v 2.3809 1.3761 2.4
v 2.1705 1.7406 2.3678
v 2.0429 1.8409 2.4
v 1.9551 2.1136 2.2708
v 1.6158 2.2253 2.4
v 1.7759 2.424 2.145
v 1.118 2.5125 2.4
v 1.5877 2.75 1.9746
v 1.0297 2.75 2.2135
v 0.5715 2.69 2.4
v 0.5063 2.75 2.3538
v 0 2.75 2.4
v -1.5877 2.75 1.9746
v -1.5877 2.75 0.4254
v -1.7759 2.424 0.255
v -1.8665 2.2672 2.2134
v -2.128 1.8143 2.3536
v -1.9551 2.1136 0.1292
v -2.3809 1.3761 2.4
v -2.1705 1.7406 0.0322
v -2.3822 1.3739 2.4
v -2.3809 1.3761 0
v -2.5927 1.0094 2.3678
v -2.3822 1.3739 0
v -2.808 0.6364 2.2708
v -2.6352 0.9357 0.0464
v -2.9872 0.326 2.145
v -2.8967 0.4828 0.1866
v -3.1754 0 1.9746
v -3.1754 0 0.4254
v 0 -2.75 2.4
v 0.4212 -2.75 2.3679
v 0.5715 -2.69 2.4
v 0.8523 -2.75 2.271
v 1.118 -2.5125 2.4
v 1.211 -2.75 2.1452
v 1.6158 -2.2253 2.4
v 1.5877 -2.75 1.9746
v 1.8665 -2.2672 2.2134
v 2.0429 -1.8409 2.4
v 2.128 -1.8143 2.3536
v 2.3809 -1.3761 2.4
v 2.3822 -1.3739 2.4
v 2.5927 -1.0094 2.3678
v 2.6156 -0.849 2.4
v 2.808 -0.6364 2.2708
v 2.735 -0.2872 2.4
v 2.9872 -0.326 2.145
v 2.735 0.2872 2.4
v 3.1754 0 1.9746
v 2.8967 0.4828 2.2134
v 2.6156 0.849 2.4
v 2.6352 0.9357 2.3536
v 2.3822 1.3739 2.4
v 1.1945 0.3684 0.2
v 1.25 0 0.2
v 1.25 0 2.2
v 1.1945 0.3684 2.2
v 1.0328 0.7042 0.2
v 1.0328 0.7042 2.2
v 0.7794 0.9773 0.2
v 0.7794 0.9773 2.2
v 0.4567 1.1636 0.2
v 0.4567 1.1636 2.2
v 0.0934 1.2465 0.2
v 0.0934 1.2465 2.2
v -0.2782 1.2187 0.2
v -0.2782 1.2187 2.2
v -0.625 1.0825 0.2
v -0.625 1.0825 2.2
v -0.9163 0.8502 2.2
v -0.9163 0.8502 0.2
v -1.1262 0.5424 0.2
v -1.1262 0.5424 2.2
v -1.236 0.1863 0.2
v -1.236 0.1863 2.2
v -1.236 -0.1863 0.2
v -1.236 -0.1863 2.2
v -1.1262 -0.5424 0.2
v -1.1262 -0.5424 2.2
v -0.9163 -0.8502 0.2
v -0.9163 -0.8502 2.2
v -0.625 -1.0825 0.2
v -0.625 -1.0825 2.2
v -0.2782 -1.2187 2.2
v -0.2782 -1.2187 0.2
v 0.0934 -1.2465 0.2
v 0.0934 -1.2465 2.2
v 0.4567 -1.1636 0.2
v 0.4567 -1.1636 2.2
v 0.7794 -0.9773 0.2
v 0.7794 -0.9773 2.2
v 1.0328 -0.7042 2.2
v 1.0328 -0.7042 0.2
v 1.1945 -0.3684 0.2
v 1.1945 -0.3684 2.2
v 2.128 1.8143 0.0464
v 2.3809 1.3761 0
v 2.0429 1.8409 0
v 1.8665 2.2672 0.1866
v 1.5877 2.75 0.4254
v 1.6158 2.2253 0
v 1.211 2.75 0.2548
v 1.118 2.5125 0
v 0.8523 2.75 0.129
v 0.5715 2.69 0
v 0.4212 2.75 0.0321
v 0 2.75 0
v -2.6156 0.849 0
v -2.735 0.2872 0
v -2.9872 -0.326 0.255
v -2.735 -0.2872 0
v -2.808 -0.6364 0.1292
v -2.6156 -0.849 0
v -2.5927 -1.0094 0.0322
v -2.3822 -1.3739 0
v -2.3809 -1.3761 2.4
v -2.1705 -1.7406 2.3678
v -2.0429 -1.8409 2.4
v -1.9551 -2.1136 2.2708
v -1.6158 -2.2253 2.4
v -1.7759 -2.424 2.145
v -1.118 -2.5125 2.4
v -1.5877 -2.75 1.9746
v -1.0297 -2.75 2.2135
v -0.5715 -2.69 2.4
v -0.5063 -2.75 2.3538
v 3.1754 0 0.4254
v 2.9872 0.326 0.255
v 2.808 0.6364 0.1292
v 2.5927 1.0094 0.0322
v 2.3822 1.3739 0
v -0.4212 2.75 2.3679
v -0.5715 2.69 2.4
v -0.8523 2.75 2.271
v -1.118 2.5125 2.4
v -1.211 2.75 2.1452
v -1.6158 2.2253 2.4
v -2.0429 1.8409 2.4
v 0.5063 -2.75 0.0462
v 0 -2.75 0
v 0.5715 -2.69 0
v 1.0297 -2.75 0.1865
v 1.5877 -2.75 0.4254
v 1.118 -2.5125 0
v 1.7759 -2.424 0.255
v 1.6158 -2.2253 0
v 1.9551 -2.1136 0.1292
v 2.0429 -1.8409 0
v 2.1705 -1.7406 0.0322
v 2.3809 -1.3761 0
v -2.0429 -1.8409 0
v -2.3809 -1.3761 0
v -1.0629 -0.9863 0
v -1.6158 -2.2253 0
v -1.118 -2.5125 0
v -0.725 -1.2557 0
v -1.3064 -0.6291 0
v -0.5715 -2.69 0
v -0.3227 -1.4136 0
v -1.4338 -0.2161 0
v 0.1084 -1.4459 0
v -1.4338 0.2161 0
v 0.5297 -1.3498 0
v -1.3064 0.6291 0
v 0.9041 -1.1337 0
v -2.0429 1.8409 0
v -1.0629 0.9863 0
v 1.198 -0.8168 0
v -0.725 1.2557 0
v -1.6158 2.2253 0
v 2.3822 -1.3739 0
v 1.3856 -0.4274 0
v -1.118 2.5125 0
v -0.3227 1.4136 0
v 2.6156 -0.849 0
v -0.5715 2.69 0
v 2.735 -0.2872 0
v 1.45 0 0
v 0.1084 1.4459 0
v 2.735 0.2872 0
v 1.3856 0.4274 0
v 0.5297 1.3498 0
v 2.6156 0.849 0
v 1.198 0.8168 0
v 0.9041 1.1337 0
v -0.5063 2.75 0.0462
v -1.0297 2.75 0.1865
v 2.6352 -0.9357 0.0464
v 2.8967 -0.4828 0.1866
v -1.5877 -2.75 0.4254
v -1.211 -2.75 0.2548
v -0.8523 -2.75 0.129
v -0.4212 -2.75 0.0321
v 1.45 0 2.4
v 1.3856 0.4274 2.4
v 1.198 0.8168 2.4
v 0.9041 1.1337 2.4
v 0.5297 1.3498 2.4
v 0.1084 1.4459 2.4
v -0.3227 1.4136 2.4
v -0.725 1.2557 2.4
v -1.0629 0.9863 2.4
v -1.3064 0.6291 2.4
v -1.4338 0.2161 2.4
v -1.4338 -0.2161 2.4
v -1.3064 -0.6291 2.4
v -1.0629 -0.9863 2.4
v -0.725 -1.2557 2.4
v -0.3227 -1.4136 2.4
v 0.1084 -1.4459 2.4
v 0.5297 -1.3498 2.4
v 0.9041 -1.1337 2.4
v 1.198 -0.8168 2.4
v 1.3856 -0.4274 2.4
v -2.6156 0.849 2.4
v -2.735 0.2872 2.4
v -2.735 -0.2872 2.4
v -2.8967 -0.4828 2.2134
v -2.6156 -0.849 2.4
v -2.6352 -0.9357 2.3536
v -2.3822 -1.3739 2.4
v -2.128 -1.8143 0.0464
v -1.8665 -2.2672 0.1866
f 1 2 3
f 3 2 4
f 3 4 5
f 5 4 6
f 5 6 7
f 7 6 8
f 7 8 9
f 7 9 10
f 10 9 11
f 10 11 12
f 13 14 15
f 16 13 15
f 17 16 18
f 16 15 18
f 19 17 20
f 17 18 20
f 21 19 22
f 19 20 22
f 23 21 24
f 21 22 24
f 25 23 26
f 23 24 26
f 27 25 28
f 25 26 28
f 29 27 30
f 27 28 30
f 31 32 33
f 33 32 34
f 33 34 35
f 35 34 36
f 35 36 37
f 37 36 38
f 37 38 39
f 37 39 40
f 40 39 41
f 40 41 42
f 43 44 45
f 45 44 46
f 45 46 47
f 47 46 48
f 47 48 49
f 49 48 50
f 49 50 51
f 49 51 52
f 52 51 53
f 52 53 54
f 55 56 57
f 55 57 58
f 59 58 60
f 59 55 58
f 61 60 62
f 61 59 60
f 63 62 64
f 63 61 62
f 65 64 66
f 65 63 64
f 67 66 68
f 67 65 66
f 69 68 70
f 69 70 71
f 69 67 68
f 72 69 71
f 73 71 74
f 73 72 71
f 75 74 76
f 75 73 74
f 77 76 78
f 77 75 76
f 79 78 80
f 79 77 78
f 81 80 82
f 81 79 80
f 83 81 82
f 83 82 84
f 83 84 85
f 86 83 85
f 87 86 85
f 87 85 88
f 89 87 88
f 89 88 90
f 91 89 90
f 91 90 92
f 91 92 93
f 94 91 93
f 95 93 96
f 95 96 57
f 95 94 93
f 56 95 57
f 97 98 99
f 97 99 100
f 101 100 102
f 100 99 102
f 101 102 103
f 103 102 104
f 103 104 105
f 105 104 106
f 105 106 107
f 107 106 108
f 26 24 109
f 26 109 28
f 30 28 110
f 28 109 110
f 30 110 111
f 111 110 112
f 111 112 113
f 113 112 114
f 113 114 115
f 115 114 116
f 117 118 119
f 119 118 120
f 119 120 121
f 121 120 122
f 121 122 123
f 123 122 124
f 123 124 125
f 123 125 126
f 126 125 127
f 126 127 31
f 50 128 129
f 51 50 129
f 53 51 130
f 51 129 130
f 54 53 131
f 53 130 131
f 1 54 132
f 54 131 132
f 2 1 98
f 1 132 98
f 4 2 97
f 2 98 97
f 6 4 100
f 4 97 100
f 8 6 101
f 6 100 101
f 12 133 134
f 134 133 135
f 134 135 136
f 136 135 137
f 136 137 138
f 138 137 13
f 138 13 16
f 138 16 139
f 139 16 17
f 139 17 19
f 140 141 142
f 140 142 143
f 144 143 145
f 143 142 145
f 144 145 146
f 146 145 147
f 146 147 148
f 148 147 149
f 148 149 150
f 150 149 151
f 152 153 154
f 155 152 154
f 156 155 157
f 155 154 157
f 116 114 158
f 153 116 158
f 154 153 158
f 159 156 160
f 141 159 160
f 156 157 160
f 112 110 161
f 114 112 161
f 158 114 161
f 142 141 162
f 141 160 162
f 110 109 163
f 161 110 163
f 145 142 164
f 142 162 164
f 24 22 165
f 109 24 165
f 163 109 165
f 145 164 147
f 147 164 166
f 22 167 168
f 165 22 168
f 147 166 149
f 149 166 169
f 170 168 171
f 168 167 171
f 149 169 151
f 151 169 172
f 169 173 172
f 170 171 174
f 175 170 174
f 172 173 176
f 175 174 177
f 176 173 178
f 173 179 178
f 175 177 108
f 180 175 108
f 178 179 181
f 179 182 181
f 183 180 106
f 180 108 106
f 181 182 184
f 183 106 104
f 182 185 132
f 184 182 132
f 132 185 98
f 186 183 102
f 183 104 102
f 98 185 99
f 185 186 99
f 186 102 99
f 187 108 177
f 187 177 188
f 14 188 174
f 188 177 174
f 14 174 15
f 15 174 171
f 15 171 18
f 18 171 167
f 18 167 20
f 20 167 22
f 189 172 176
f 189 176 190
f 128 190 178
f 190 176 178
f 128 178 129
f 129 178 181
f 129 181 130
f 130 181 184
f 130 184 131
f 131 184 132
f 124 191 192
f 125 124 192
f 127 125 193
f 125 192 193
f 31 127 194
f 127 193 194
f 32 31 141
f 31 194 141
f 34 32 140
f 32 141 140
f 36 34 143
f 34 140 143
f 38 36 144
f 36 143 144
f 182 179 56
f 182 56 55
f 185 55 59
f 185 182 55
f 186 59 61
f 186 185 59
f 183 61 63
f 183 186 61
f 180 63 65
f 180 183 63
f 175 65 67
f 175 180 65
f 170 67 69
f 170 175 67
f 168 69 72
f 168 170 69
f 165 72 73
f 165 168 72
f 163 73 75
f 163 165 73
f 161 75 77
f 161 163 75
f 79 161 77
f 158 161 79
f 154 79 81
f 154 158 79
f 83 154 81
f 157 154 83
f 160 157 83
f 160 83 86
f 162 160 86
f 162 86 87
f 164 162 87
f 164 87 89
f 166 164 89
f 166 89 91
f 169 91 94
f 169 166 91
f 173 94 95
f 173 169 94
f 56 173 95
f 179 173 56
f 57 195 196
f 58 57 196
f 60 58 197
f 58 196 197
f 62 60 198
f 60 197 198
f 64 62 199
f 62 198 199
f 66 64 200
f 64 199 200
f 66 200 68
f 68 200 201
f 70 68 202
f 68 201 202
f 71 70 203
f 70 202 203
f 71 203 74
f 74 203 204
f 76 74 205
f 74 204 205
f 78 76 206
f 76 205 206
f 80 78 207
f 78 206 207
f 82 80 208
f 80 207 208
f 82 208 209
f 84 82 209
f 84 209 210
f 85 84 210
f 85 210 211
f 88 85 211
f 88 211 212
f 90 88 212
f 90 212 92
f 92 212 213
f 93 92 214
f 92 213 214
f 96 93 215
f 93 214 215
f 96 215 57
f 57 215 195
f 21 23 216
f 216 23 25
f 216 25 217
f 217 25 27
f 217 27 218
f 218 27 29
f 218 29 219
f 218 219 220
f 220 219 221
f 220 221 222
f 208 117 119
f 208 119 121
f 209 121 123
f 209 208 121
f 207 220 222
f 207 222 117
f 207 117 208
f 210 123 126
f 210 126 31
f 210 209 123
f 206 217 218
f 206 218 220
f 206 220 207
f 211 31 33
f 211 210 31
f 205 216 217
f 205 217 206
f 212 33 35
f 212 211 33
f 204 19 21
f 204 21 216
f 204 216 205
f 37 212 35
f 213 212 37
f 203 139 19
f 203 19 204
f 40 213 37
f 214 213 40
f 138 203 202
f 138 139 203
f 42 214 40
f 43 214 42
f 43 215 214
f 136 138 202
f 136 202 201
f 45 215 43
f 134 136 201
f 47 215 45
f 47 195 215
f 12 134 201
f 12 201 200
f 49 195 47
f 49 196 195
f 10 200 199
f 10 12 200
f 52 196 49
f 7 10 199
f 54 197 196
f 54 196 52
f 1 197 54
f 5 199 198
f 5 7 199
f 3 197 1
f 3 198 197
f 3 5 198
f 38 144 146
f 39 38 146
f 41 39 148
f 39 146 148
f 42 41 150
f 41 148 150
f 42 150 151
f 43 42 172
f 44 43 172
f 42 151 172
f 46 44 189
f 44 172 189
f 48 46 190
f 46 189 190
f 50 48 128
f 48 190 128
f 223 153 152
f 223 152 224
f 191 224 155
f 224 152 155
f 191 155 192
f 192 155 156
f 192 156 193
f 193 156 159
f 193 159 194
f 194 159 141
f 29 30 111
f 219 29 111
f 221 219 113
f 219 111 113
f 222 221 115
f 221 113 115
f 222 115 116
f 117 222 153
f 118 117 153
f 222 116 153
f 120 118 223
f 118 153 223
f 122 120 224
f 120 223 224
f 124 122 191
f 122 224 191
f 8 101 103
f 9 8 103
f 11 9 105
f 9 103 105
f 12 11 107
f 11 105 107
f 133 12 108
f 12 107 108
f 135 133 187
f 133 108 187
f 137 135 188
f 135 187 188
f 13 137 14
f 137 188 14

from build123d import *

# Parameters (mm, degrees)
F0_R     = 1.25
F1_DEPTH = 2.4
F2_SIZE  = 0.2


with BuildPart() as f1:
    # F0 (on Top) → F1 (new body)
    with BuildSketch(Plane.XY):
        Polygon((1.587713, 2.75), (-1.587713, 2.75), (-3.175426, 0), (-1.587713, -2.75), (1.587713, -2.75), (3.175426, 0), align=None)
        Circle(F0_R, mode=Mode.SUBTRACT)
    extrude(amount=F1_DEPTH)

    # F2
    f2_edges = [f1.edges().sort_by_distance(p)[0] for p in [
        (-1.25, 0, 2.4),
        (-1.25, 0, 0),
    ]]
    chamfer(f2_edges, length=F2_SIZE)

    # F3 (on Front) → F4 (revolve, cut)
    with BuildSketch(Plane.XZ):
        Polygon((3.375426, 0.625426), (2.75, 0), (3.738599, 0), (3.738599, 2.737111), (2.75, 2.737111), (2.75, 2.4), (3.375426, 1.774574), align=None)
    revolve(axis=Axis((0, 0, 1.849946), (0, 0, 1)), mode=Mode.SUBTRACT)


solid = f1.part
